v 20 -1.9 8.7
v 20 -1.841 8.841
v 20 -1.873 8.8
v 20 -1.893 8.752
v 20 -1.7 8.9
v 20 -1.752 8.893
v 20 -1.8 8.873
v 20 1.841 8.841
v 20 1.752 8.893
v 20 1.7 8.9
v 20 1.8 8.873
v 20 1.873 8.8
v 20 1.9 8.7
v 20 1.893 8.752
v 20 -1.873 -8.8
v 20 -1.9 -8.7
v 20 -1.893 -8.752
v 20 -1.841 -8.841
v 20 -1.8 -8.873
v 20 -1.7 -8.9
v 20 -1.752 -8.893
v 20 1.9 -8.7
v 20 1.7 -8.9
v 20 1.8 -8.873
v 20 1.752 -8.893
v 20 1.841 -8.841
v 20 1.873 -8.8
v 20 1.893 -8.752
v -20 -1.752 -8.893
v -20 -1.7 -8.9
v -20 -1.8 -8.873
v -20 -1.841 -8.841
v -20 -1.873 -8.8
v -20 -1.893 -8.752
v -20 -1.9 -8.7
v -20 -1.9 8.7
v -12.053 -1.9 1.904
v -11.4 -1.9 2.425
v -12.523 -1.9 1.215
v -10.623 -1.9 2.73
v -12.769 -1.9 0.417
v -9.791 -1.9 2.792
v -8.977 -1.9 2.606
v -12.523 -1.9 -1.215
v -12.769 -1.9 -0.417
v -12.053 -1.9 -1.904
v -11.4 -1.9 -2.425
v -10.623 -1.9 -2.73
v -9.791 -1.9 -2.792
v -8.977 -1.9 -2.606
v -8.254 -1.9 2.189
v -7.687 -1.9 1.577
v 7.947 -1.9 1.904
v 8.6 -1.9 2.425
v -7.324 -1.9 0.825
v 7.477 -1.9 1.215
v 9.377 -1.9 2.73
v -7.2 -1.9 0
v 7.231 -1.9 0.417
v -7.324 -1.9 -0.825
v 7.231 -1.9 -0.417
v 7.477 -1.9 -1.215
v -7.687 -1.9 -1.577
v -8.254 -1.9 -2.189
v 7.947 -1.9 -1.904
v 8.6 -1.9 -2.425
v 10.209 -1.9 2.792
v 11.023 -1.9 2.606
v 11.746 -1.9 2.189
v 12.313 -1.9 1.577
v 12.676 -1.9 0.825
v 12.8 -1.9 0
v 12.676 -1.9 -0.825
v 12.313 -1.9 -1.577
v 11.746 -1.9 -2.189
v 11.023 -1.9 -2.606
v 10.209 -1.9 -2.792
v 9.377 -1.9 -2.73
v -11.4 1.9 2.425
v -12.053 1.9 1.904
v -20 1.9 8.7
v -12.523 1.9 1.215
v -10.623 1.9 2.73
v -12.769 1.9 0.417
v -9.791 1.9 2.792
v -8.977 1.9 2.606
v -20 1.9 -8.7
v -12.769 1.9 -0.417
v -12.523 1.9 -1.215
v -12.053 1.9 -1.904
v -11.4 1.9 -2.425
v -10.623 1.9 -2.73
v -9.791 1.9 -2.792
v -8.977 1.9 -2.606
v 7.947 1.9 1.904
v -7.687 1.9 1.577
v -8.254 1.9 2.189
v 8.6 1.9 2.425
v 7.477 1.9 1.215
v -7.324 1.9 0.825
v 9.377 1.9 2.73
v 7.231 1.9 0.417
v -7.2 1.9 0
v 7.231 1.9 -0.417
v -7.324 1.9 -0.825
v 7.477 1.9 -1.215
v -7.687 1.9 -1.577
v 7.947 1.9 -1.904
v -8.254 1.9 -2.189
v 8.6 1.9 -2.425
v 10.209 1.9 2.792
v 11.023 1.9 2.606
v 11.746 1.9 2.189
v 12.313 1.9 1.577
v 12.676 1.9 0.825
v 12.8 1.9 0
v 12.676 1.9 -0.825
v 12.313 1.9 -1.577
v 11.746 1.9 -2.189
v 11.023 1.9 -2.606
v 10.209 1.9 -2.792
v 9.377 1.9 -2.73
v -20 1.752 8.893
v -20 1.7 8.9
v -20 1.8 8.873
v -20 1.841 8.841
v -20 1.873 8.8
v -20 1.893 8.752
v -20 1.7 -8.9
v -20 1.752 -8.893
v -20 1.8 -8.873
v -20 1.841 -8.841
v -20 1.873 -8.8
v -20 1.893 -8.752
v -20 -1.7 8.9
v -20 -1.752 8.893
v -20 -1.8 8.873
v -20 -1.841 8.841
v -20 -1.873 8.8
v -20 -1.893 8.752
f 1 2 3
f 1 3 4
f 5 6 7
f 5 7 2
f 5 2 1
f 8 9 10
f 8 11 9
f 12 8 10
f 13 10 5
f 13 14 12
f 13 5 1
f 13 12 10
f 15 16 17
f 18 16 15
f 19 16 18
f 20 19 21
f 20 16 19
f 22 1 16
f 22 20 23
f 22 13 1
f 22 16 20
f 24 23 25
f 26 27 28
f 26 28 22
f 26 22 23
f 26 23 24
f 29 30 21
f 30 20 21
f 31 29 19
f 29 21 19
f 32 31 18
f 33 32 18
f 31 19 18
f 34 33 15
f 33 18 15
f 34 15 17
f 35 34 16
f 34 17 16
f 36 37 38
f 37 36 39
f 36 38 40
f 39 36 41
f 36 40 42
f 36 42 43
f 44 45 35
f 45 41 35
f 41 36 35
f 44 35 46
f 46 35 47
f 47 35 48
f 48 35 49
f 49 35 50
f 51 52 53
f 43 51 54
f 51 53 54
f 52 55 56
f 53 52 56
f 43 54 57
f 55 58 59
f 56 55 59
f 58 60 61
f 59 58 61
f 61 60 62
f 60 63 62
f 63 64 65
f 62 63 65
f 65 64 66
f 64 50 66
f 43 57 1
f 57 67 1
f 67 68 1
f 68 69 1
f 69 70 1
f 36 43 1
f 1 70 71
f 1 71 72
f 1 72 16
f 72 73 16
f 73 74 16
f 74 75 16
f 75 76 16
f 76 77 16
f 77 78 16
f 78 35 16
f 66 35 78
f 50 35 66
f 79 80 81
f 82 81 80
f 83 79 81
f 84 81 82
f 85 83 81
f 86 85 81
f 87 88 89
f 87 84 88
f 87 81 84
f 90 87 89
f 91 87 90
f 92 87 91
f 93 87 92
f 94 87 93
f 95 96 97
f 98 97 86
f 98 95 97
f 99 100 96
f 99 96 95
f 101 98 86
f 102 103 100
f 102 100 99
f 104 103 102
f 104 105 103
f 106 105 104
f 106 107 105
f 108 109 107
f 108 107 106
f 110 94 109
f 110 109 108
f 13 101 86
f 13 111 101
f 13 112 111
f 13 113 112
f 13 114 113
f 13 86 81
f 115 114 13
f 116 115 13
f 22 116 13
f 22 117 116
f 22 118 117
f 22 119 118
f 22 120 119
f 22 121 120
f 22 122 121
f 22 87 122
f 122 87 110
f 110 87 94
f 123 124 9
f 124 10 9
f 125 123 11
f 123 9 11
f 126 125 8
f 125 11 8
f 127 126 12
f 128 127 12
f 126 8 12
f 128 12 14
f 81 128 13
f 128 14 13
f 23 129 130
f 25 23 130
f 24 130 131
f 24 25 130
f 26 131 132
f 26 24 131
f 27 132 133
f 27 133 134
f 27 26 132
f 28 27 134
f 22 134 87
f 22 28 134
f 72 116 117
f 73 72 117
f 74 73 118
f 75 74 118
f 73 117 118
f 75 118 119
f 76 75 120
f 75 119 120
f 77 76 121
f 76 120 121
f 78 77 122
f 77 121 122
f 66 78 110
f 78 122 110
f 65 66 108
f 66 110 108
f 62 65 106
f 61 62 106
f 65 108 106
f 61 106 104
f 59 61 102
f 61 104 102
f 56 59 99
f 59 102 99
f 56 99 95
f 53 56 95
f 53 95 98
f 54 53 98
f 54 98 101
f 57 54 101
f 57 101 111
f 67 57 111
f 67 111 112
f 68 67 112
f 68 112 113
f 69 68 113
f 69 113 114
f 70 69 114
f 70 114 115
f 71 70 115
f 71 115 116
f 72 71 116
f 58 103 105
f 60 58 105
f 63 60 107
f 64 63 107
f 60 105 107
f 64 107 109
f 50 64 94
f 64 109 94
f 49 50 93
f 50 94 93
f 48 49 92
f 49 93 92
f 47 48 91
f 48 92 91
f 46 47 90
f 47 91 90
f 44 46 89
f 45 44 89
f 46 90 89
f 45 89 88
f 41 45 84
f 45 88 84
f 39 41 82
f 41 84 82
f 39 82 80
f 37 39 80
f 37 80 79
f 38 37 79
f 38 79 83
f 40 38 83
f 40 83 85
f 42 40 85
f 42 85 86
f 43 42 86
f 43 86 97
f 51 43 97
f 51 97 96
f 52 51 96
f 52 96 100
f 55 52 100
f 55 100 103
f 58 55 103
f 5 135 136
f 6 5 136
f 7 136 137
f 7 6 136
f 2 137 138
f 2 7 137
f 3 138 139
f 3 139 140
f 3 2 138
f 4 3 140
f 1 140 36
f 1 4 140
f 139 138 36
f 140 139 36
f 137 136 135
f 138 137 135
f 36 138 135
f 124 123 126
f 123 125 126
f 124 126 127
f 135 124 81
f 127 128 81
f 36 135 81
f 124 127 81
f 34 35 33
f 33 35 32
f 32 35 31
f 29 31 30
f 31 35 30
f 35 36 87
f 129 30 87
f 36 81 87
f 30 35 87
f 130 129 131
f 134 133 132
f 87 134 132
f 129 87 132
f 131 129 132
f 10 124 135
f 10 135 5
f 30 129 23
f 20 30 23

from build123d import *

# Parameters (mm, degrees)
SKETCH1_W                      = 40
SKETCH1_H                      = 17.8
BOSS_EXTRUDE1_DEPTH            = 3.8
F_5_6_5_6_DIAMETER_HOLE1_D     = 5.6
F_5_6_5_6_DIAMETER_HOLE1_DEPTH = 3.8
FILLET1_R                      = 0.2


with BuildPart() as part:
    # Sketch1 → Boss-Extrude1 (new body)
    with BuildSketch(Plane(origin=(0, 1.9, 0), x_dir=(1, 0, 0), z_dir=(0, 1, 0))):
        Rectangle(SKETCH1_W, SKETCH1_H)
    extrude(amount=-BOSS_EXTRUDE1_DEPTH)

    # Ø5.6 (5.6) Diameter Hole1
    with Locations(Plane(origin=(0, -1.9, 0), x_dir=(-1, 0, 0), z_dir=(0, -1, 0))):
        with Locations((10, 0), (-10, 0)):
            Hole(F_5_6_5_6_DIAMETER_HOLE1_D / 2, depth=F_5_6_5_6_DIAMETER_HOLE1_DEPTH)

    # Fillet1
    fillet1_edges = [part.edges().sort_by_distance(p)[0] for p in [
        (0, -1.9, -8.9),
        (0, -1.9, 8.9),
        (0, 1.9, -8.9),
        (0, 1.9, 8.9),
    ]]
    fillet(fillet1_edges, radius=FILLET1_R)


solid = part.part
